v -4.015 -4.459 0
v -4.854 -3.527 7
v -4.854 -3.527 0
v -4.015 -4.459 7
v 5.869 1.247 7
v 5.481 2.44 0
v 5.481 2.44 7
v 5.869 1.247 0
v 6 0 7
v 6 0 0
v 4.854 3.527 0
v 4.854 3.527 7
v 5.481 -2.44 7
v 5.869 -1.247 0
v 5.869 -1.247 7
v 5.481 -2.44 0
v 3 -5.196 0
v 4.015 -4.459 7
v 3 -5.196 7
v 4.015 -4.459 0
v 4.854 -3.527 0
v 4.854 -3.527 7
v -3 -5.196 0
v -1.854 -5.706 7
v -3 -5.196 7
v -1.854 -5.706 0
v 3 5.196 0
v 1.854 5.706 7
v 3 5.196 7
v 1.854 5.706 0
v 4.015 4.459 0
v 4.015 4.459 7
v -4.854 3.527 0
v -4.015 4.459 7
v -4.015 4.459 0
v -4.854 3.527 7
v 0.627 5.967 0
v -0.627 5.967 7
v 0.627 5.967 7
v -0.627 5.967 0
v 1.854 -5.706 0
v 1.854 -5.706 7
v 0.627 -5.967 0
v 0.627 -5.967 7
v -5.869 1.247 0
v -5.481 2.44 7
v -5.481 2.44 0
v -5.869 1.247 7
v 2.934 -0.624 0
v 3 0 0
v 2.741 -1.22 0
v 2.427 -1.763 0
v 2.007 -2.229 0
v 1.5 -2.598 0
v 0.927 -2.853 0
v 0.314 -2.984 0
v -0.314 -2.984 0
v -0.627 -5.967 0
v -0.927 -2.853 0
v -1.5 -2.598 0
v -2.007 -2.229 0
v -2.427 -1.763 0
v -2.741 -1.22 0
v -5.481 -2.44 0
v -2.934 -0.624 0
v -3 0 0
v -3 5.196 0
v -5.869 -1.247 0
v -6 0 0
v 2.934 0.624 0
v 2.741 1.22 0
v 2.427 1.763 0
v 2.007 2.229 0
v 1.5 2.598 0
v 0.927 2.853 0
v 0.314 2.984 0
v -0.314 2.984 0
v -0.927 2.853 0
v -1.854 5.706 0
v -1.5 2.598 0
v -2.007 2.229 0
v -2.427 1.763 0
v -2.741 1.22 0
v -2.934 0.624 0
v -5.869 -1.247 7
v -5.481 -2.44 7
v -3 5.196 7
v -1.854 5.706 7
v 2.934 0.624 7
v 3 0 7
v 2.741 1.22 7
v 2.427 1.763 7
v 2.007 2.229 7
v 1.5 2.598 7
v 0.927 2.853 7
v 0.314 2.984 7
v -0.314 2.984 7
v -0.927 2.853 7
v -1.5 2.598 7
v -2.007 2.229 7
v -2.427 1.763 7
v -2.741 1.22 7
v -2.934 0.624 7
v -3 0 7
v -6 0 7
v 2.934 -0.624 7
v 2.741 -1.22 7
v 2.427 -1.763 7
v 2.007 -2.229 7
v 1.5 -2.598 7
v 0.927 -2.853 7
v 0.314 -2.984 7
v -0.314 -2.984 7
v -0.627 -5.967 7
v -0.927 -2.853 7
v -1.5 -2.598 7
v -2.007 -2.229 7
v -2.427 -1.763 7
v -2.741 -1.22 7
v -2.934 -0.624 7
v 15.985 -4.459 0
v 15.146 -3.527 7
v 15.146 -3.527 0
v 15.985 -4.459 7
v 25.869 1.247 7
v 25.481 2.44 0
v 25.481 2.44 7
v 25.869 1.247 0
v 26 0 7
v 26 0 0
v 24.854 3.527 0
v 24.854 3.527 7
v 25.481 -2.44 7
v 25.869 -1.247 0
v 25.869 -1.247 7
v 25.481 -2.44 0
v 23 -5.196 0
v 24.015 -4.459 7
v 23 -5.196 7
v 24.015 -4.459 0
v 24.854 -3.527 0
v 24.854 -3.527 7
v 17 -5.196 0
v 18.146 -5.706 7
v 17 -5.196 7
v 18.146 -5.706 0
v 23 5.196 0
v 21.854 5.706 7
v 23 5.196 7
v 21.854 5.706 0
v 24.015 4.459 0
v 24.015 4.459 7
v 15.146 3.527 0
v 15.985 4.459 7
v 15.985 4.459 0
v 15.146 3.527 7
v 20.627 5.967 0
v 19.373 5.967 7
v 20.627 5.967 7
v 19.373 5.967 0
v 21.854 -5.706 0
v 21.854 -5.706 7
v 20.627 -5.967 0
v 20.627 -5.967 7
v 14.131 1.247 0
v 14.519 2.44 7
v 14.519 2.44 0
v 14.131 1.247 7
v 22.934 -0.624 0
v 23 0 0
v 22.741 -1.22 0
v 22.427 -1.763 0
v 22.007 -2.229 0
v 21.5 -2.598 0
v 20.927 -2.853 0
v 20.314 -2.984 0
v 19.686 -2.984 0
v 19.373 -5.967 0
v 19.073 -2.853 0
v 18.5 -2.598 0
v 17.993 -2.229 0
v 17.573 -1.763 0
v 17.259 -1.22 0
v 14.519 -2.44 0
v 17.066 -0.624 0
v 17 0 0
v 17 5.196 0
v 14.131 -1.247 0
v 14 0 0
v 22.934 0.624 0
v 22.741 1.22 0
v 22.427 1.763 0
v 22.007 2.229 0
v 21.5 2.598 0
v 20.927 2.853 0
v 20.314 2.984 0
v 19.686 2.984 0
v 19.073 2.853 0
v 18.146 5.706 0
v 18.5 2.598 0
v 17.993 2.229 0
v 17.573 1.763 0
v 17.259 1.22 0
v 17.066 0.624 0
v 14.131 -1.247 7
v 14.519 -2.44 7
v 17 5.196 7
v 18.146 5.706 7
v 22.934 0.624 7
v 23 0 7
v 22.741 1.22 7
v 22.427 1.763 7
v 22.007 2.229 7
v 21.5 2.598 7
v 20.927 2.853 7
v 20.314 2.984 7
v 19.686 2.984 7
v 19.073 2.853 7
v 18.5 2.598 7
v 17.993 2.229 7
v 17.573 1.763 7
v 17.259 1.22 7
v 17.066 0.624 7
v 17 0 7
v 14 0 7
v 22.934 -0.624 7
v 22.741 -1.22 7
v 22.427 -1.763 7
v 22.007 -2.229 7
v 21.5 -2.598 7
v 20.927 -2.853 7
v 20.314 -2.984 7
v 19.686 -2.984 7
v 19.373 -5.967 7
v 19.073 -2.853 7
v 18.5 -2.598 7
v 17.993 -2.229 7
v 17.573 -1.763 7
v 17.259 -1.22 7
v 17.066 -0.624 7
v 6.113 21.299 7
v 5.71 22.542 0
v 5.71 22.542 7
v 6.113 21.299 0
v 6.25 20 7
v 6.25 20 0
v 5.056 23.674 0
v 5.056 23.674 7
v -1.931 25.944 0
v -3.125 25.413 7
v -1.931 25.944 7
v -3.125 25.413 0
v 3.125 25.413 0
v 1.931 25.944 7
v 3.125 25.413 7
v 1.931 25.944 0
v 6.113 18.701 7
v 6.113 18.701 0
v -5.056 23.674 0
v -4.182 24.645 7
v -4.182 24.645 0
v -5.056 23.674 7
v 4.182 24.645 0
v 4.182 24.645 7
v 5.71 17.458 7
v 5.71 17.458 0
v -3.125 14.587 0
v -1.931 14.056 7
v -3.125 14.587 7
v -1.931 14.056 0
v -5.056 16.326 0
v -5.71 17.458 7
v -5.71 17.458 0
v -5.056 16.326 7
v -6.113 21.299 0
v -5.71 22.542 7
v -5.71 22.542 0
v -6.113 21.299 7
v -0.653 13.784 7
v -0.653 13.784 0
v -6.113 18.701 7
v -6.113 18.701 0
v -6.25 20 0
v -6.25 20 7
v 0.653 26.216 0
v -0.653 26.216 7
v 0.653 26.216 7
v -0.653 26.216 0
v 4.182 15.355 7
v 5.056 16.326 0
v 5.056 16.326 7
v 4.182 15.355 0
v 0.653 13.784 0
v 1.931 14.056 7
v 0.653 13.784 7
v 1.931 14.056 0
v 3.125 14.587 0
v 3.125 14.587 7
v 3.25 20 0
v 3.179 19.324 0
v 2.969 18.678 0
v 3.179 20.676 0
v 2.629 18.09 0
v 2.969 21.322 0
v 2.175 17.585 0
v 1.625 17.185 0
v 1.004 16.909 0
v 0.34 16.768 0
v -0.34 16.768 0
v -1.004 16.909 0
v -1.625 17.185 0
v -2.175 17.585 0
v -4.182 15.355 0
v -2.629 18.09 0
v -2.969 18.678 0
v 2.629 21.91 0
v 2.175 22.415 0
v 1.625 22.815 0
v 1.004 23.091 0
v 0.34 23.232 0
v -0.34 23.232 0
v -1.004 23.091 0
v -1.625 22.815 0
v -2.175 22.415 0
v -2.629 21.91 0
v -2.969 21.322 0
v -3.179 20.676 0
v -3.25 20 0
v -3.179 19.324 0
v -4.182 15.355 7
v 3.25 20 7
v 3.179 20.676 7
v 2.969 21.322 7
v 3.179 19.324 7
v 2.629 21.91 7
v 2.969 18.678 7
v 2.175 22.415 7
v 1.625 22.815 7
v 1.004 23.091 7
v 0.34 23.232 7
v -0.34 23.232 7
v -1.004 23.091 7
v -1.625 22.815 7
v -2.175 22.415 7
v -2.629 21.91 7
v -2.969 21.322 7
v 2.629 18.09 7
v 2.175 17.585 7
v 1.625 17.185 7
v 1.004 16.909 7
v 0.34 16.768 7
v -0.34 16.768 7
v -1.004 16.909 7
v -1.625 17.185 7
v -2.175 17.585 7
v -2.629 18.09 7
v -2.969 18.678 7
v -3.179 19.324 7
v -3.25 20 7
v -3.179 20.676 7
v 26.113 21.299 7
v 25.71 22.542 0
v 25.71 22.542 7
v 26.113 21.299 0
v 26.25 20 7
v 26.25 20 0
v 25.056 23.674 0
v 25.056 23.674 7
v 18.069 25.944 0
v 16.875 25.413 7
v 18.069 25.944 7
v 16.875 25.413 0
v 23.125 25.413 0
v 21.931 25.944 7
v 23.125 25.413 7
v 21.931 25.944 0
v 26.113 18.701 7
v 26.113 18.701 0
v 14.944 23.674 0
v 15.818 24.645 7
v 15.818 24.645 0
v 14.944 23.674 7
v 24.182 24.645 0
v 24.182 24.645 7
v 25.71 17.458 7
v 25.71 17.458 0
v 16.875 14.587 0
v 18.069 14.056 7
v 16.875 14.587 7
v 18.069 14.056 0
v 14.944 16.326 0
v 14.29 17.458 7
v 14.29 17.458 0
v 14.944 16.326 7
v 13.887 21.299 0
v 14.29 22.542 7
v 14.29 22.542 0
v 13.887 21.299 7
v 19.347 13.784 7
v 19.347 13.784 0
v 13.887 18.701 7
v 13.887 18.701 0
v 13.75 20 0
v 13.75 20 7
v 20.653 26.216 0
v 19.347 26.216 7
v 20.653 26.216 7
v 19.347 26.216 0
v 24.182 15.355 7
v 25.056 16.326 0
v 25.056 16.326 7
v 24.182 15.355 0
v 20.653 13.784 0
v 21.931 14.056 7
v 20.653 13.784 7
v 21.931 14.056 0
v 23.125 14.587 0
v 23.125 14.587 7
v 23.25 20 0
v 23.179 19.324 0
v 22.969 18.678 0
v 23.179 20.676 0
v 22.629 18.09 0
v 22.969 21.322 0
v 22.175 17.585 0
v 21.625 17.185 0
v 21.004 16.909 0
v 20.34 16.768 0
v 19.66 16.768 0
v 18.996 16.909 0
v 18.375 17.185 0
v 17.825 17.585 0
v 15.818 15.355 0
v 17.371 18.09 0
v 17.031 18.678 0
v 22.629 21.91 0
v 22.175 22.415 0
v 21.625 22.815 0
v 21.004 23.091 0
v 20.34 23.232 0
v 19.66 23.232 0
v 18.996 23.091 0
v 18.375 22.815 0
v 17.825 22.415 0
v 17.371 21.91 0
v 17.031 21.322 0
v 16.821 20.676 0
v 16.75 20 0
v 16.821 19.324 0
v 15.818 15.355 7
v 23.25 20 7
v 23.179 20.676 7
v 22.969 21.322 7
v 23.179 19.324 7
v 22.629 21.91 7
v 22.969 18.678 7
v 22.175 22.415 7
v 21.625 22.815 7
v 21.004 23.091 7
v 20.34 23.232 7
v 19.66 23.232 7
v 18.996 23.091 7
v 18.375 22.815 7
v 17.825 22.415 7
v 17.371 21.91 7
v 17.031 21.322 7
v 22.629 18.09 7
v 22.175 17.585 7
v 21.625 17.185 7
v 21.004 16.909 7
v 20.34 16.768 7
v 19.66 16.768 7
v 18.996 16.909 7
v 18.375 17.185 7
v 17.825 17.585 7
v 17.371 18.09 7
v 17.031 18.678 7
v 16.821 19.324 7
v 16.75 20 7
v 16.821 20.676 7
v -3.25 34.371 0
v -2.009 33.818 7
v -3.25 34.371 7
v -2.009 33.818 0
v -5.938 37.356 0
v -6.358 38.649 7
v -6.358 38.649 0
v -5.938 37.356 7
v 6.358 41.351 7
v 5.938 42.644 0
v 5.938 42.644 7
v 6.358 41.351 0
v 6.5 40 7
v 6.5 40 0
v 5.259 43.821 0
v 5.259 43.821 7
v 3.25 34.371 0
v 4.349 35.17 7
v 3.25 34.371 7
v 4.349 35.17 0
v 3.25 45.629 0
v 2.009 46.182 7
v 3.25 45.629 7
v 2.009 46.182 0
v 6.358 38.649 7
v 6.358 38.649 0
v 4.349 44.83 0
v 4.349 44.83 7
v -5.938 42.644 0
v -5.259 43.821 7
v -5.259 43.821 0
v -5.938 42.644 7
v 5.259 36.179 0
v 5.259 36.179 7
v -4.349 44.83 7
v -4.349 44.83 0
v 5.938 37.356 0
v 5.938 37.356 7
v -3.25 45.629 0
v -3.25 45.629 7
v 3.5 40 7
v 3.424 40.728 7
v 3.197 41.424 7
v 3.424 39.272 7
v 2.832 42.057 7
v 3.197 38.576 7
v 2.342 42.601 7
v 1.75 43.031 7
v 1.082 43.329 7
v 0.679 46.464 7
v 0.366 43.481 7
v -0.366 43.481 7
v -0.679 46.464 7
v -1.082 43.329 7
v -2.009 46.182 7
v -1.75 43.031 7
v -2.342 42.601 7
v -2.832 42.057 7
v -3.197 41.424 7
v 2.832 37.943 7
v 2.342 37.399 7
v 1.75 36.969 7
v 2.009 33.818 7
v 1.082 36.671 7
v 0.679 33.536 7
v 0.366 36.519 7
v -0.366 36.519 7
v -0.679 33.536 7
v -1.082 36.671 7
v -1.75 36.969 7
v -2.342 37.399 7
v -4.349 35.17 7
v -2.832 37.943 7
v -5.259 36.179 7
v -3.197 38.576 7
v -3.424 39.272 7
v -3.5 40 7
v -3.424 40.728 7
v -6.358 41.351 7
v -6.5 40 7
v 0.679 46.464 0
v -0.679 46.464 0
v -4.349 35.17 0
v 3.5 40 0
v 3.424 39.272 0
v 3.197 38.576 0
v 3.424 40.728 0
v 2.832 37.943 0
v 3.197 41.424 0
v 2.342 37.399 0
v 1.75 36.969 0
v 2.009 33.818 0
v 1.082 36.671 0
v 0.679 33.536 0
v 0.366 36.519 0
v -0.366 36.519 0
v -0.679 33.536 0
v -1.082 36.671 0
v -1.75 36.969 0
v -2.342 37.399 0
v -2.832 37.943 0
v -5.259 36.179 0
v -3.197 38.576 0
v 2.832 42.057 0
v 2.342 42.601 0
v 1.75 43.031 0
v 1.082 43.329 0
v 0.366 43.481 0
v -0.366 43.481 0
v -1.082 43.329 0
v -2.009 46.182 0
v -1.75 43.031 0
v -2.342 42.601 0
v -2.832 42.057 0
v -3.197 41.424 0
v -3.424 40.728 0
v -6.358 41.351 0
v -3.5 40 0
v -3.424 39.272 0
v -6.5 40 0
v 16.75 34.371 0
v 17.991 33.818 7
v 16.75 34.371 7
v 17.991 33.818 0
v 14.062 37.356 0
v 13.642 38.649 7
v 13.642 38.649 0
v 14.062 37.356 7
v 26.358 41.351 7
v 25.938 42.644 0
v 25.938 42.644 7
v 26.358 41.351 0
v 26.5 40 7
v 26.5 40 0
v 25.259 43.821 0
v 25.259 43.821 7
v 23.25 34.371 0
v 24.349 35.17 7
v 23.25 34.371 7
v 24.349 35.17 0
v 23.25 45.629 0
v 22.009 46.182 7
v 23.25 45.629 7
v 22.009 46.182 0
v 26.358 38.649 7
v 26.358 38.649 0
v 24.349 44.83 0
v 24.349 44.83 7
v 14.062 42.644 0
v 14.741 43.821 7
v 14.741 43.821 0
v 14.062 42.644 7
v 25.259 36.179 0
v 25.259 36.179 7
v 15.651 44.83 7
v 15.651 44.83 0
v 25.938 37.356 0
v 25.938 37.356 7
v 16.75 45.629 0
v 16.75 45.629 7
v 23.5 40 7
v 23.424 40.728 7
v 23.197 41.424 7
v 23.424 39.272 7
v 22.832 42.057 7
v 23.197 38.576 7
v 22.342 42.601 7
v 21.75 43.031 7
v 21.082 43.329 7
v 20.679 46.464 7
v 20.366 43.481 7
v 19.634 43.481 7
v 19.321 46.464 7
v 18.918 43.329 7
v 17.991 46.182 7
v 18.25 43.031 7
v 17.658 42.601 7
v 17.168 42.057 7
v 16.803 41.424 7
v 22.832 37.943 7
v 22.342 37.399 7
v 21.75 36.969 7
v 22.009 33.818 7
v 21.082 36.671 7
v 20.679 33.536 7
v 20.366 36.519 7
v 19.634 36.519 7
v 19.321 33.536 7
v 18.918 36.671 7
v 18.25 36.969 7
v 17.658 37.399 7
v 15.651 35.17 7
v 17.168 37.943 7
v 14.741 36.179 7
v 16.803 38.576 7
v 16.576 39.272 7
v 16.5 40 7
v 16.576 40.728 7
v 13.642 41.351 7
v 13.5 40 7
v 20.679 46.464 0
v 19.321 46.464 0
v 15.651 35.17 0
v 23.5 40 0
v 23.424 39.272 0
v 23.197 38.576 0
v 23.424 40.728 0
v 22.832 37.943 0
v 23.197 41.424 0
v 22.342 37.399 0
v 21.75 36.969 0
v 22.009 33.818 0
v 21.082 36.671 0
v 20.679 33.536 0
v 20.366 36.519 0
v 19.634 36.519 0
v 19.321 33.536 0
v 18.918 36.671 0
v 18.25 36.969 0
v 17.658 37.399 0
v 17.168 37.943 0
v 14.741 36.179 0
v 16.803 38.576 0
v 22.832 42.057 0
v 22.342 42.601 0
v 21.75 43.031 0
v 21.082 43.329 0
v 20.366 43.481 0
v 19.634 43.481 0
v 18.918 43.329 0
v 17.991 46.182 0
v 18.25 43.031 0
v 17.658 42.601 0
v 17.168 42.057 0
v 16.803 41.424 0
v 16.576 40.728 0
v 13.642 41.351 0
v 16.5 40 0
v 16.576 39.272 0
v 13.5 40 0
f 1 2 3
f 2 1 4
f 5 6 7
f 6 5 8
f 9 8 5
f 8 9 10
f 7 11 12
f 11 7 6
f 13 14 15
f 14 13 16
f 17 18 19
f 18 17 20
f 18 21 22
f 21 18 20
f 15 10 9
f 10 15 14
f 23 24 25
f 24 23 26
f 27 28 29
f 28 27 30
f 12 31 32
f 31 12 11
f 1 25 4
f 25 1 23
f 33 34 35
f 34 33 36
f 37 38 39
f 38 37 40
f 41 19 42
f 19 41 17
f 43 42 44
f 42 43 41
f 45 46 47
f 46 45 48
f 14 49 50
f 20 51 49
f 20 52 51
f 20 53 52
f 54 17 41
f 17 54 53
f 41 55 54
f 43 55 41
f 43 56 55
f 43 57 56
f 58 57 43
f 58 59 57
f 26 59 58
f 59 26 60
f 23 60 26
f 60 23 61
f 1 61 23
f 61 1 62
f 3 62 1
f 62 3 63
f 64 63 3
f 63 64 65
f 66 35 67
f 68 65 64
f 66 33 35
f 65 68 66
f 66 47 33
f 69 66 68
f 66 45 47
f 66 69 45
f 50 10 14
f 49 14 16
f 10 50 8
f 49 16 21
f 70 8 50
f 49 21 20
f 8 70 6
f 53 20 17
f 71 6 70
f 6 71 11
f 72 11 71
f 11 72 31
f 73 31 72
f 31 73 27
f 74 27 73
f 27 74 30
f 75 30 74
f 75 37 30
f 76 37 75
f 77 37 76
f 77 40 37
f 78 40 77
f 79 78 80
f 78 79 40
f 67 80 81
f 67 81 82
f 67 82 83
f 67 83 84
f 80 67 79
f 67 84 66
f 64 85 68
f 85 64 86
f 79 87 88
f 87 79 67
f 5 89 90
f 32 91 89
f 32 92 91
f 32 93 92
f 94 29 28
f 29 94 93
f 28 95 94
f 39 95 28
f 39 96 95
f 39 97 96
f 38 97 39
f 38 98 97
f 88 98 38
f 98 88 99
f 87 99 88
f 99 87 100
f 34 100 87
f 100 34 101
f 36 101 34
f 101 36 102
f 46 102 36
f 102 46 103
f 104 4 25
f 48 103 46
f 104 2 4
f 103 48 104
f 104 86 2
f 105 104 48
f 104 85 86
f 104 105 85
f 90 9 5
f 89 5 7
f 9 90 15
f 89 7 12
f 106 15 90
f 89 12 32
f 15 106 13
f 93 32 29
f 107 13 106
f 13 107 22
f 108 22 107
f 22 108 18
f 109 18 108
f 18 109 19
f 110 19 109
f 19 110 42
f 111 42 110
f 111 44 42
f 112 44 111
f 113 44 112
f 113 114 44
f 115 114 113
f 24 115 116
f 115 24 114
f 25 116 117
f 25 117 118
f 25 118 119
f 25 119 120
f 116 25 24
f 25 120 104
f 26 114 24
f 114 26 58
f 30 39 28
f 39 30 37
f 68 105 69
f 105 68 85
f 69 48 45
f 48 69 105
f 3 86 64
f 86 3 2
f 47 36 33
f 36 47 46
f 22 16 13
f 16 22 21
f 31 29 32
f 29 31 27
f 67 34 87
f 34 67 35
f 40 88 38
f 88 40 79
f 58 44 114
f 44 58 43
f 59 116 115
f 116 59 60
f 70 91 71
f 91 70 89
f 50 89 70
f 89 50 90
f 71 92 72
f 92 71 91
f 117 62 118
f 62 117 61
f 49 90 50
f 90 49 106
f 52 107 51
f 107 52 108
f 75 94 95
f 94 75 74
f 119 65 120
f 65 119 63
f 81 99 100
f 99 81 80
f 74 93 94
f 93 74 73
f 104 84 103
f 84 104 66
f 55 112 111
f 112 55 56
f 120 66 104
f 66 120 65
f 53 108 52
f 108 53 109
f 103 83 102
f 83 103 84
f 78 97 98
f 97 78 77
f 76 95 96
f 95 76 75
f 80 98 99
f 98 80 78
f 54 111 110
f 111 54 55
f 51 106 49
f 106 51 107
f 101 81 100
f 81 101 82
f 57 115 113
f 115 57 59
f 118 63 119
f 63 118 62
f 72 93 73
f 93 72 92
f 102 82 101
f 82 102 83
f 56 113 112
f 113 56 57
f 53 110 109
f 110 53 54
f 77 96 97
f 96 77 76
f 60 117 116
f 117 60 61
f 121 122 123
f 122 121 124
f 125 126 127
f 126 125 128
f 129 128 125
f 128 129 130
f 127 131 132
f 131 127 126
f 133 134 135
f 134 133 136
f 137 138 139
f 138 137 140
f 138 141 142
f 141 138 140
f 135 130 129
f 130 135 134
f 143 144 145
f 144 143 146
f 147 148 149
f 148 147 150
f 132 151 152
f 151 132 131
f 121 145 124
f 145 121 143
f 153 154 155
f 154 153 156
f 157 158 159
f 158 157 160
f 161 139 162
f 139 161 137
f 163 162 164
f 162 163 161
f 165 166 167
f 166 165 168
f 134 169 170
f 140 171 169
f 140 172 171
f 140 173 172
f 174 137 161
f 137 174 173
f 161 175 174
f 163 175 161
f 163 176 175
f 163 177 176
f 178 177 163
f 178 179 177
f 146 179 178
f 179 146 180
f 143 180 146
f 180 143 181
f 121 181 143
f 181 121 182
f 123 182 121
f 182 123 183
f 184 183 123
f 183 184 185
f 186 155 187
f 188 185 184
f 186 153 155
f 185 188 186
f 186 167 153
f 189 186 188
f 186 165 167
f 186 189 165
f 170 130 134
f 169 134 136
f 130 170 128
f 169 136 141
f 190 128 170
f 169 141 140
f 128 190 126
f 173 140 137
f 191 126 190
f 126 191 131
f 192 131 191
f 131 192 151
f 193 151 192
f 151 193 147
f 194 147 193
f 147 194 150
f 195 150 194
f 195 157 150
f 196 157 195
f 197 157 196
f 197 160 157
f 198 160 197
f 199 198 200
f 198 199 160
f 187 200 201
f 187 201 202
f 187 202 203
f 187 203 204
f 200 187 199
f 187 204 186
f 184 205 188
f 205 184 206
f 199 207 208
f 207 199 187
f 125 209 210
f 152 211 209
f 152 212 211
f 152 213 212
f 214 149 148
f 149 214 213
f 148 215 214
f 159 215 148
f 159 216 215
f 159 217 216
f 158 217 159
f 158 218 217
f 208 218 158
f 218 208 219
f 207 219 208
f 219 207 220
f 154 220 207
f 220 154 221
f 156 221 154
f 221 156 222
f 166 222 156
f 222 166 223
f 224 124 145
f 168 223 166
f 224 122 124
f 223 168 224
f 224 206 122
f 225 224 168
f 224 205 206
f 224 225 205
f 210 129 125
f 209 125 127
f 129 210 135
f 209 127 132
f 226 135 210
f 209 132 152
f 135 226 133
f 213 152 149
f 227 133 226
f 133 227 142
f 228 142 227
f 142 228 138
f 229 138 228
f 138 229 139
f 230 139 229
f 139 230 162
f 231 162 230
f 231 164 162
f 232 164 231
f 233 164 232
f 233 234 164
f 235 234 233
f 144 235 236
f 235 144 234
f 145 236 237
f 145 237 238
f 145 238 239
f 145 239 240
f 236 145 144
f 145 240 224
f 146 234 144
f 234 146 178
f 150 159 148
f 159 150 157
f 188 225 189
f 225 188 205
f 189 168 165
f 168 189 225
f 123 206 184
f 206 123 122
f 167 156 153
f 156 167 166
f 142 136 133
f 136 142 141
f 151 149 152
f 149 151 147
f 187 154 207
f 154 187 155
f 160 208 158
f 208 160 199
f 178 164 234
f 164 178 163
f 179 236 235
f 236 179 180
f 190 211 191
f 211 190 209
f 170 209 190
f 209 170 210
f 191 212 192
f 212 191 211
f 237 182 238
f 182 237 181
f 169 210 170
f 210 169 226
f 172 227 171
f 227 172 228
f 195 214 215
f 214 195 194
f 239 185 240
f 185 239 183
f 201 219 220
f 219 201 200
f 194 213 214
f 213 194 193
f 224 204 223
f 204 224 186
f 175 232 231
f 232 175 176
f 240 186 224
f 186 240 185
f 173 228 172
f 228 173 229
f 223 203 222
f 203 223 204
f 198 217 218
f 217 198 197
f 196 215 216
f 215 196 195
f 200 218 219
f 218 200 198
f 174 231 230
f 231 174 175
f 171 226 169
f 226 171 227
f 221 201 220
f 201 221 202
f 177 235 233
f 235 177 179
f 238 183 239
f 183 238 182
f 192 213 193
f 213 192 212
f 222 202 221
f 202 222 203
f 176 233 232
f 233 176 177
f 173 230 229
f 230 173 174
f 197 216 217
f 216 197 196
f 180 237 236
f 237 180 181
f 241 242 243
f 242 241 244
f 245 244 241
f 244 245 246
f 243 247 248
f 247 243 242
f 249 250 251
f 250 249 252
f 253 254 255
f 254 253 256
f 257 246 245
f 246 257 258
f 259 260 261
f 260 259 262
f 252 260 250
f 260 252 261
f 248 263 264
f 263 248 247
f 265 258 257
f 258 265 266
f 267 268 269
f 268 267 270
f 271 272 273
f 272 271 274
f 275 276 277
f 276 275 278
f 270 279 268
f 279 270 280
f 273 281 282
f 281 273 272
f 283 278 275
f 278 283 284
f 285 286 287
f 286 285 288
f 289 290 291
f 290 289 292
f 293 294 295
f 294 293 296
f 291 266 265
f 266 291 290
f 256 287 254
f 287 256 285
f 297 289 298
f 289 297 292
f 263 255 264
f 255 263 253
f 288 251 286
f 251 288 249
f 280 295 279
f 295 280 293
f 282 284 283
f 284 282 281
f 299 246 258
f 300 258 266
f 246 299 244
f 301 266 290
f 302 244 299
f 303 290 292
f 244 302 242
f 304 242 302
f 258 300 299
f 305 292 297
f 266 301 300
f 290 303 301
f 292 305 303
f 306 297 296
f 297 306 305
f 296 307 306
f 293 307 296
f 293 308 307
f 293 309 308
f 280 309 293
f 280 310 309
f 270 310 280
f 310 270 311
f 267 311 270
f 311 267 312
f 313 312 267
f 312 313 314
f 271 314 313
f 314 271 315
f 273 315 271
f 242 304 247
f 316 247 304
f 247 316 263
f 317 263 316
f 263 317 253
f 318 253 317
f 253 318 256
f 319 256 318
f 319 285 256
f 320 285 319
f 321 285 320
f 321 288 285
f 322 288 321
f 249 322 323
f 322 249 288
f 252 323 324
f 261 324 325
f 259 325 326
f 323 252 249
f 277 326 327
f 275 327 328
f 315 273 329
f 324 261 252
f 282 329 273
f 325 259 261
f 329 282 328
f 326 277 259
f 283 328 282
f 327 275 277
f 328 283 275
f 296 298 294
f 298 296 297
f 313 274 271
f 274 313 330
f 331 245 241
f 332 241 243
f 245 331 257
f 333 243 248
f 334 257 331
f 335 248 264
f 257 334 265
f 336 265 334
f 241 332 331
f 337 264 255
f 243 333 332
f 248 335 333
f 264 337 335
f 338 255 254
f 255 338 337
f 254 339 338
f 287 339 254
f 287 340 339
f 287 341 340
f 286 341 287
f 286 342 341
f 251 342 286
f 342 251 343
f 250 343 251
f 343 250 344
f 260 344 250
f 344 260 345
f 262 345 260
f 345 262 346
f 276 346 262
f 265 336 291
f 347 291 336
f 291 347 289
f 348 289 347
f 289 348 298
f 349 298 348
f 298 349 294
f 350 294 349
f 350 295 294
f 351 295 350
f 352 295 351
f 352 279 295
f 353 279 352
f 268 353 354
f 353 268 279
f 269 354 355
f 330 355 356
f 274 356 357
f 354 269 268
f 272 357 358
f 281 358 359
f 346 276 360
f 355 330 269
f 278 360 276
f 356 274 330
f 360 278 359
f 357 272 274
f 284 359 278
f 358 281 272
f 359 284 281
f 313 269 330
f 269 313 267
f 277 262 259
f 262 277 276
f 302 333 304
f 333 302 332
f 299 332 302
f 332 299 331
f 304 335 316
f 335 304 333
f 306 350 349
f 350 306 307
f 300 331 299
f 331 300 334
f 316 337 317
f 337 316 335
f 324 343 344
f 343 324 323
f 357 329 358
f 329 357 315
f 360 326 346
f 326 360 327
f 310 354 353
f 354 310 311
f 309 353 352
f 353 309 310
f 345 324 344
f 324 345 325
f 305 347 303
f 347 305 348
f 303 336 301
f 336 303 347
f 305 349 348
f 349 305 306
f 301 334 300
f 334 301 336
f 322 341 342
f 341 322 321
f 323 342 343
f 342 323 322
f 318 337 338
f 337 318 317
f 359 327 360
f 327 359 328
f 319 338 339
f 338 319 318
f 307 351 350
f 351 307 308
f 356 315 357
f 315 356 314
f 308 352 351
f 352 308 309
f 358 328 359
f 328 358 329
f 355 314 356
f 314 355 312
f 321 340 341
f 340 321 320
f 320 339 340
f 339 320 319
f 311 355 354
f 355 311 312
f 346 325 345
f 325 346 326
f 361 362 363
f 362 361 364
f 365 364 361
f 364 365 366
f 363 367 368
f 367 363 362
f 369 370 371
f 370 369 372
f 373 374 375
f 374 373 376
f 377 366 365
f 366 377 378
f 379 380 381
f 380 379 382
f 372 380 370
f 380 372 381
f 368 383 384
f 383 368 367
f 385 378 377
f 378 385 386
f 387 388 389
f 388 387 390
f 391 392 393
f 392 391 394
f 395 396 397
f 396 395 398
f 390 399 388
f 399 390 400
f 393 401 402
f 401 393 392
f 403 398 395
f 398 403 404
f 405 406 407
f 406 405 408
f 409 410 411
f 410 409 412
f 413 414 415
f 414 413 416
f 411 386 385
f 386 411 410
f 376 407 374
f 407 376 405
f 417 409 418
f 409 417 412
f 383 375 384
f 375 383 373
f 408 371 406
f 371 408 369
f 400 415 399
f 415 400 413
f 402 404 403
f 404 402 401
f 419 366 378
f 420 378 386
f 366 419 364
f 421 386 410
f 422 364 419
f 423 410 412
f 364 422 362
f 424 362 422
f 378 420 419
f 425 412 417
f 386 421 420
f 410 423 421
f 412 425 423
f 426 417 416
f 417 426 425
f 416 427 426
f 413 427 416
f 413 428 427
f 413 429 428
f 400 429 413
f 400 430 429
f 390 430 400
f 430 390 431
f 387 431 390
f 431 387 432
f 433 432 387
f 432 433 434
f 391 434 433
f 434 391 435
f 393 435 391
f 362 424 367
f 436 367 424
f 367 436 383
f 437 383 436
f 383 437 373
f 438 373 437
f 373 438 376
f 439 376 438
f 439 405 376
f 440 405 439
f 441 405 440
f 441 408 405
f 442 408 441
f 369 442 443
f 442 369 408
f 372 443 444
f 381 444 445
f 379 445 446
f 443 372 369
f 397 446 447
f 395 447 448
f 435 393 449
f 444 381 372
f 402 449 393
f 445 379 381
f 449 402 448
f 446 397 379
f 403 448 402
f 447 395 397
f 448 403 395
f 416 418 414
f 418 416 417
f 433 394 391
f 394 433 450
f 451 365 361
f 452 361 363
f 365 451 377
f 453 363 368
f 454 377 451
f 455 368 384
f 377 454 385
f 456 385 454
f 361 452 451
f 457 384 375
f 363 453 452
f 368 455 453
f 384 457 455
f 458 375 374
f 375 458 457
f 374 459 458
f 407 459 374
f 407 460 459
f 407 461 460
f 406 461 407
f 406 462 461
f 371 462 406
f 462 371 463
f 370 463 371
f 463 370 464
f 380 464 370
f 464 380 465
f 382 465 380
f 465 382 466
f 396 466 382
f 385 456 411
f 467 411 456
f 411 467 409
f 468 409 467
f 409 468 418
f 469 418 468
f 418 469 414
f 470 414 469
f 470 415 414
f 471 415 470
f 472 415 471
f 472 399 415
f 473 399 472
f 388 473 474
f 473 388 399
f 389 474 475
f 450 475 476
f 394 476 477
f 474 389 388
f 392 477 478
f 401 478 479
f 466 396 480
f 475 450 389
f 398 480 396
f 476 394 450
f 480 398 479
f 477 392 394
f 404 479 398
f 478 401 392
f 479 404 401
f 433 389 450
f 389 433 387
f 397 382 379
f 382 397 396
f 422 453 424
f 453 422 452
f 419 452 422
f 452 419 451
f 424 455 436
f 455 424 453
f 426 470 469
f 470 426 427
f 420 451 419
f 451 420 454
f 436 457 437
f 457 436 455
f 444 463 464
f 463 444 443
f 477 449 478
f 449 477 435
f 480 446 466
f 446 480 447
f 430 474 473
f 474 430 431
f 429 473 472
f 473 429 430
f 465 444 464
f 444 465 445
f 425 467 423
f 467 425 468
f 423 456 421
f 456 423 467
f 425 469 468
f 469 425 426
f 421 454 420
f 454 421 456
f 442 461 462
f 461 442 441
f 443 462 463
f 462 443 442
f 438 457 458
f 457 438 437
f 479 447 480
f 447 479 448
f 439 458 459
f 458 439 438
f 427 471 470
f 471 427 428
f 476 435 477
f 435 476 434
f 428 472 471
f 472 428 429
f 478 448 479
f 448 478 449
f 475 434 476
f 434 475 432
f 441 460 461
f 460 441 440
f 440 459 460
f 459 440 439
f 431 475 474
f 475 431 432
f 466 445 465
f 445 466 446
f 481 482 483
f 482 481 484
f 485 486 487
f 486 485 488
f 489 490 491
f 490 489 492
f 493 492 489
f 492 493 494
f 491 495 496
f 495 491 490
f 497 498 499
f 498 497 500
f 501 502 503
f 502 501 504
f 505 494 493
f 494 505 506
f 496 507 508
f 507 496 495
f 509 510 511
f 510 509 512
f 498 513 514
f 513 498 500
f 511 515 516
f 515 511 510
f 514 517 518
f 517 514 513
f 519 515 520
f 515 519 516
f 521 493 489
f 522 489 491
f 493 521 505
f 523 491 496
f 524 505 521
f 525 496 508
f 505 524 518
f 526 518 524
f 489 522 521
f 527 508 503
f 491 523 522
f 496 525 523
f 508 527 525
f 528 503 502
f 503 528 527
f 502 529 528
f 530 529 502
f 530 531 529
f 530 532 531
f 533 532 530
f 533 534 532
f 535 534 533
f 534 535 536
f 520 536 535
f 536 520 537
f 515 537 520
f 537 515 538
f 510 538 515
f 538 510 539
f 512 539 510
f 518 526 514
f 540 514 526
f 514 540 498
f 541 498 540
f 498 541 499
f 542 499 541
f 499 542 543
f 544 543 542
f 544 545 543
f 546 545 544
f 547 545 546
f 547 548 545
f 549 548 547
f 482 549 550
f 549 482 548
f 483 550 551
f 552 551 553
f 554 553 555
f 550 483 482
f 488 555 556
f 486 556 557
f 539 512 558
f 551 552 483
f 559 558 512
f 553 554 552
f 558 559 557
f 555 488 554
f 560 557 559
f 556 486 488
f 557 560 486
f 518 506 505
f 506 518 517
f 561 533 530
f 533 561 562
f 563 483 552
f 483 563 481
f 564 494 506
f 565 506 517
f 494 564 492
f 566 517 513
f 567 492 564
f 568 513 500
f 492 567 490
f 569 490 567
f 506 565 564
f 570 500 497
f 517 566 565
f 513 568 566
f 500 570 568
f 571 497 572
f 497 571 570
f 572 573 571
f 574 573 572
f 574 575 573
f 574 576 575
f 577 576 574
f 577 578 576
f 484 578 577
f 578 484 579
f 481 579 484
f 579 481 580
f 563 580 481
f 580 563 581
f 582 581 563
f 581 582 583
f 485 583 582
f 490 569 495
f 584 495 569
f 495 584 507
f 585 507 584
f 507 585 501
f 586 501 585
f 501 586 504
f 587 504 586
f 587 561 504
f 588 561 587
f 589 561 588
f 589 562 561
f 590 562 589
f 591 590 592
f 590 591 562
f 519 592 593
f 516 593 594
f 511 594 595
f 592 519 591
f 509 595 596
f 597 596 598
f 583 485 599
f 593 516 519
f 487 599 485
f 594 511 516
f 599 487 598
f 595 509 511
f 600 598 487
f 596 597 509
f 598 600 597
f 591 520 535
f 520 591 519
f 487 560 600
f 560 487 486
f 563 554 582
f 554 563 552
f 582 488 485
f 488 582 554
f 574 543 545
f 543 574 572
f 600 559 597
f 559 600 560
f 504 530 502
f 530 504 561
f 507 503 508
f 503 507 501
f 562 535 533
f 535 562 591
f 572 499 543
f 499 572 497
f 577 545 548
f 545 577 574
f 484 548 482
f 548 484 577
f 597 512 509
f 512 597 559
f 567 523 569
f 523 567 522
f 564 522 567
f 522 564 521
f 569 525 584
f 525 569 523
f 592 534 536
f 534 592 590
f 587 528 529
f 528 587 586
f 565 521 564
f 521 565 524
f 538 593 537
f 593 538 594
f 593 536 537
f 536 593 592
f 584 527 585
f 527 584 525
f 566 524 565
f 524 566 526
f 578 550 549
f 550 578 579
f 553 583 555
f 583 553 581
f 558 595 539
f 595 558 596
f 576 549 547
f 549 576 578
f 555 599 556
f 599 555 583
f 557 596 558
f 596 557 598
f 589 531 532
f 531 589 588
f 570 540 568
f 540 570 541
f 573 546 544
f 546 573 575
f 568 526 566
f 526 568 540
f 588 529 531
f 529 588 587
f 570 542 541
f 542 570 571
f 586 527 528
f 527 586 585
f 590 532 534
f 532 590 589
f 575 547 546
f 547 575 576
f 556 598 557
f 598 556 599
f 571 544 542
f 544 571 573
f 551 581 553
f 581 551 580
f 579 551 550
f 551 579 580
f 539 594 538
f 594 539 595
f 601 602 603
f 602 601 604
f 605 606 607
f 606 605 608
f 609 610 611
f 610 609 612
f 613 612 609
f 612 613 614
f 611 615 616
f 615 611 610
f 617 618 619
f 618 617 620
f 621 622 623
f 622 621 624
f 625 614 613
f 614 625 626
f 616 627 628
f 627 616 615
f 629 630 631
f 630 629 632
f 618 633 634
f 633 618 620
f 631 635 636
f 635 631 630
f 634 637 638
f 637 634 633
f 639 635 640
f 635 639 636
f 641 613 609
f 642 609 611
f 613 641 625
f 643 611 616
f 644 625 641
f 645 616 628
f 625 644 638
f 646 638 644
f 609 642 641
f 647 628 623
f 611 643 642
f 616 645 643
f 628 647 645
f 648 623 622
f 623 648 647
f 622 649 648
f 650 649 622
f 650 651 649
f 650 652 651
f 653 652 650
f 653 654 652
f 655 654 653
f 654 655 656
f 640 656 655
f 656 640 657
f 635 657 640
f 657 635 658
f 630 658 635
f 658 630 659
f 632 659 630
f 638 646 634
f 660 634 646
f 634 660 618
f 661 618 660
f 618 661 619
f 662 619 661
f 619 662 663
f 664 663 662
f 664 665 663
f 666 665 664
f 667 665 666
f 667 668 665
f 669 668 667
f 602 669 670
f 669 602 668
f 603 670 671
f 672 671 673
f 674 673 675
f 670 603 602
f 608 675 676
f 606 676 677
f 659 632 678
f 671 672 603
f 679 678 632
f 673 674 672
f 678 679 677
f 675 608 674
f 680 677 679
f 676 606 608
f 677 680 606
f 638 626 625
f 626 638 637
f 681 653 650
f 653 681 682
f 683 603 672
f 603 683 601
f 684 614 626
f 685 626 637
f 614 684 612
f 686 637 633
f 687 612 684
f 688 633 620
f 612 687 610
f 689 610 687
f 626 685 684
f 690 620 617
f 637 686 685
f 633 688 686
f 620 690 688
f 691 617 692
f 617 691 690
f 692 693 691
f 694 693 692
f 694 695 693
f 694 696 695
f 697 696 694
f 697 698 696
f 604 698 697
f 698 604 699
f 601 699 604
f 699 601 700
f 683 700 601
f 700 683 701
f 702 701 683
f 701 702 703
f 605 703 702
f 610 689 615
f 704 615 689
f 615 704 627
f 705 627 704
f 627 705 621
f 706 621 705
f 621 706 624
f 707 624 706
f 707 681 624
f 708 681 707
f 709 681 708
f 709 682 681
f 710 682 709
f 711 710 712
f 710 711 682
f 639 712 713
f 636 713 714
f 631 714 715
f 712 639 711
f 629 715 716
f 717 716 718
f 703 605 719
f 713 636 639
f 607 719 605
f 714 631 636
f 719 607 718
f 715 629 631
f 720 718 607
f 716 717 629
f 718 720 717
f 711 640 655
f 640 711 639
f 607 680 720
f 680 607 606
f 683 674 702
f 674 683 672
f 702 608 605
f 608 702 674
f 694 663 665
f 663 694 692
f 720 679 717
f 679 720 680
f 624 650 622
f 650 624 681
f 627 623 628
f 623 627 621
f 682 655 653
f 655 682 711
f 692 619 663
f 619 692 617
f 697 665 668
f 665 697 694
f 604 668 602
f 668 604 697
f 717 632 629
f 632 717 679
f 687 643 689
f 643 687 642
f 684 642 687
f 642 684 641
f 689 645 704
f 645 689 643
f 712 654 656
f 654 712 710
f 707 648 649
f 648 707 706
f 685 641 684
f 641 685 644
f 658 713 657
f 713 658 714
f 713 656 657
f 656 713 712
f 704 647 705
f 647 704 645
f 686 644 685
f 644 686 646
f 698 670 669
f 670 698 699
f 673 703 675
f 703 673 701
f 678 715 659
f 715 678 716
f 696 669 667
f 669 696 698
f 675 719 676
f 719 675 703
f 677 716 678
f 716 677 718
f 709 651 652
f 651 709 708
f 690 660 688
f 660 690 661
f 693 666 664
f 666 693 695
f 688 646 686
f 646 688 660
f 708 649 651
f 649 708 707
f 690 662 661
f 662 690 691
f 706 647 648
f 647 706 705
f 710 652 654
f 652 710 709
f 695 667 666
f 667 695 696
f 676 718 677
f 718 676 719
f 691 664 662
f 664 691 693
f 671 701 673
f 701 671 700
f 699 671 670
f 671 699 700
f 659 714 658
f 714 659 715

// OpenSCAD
$fs=0.01;
h=7;
spacing=20;

module holderStop(phi)
{
  difference()
  {
    cylinder(r=phi/2+3, h=h);
    cylinder(r=phi/2,   h=h);
  }
}


// make different sizes
for(i = [0, 1, 2])
  // pack of 2 for each end of the holder
  for(j = [0, spacing])
    translate([j, i*spacing, 0])
      holderStop(6 + i*0.5);
